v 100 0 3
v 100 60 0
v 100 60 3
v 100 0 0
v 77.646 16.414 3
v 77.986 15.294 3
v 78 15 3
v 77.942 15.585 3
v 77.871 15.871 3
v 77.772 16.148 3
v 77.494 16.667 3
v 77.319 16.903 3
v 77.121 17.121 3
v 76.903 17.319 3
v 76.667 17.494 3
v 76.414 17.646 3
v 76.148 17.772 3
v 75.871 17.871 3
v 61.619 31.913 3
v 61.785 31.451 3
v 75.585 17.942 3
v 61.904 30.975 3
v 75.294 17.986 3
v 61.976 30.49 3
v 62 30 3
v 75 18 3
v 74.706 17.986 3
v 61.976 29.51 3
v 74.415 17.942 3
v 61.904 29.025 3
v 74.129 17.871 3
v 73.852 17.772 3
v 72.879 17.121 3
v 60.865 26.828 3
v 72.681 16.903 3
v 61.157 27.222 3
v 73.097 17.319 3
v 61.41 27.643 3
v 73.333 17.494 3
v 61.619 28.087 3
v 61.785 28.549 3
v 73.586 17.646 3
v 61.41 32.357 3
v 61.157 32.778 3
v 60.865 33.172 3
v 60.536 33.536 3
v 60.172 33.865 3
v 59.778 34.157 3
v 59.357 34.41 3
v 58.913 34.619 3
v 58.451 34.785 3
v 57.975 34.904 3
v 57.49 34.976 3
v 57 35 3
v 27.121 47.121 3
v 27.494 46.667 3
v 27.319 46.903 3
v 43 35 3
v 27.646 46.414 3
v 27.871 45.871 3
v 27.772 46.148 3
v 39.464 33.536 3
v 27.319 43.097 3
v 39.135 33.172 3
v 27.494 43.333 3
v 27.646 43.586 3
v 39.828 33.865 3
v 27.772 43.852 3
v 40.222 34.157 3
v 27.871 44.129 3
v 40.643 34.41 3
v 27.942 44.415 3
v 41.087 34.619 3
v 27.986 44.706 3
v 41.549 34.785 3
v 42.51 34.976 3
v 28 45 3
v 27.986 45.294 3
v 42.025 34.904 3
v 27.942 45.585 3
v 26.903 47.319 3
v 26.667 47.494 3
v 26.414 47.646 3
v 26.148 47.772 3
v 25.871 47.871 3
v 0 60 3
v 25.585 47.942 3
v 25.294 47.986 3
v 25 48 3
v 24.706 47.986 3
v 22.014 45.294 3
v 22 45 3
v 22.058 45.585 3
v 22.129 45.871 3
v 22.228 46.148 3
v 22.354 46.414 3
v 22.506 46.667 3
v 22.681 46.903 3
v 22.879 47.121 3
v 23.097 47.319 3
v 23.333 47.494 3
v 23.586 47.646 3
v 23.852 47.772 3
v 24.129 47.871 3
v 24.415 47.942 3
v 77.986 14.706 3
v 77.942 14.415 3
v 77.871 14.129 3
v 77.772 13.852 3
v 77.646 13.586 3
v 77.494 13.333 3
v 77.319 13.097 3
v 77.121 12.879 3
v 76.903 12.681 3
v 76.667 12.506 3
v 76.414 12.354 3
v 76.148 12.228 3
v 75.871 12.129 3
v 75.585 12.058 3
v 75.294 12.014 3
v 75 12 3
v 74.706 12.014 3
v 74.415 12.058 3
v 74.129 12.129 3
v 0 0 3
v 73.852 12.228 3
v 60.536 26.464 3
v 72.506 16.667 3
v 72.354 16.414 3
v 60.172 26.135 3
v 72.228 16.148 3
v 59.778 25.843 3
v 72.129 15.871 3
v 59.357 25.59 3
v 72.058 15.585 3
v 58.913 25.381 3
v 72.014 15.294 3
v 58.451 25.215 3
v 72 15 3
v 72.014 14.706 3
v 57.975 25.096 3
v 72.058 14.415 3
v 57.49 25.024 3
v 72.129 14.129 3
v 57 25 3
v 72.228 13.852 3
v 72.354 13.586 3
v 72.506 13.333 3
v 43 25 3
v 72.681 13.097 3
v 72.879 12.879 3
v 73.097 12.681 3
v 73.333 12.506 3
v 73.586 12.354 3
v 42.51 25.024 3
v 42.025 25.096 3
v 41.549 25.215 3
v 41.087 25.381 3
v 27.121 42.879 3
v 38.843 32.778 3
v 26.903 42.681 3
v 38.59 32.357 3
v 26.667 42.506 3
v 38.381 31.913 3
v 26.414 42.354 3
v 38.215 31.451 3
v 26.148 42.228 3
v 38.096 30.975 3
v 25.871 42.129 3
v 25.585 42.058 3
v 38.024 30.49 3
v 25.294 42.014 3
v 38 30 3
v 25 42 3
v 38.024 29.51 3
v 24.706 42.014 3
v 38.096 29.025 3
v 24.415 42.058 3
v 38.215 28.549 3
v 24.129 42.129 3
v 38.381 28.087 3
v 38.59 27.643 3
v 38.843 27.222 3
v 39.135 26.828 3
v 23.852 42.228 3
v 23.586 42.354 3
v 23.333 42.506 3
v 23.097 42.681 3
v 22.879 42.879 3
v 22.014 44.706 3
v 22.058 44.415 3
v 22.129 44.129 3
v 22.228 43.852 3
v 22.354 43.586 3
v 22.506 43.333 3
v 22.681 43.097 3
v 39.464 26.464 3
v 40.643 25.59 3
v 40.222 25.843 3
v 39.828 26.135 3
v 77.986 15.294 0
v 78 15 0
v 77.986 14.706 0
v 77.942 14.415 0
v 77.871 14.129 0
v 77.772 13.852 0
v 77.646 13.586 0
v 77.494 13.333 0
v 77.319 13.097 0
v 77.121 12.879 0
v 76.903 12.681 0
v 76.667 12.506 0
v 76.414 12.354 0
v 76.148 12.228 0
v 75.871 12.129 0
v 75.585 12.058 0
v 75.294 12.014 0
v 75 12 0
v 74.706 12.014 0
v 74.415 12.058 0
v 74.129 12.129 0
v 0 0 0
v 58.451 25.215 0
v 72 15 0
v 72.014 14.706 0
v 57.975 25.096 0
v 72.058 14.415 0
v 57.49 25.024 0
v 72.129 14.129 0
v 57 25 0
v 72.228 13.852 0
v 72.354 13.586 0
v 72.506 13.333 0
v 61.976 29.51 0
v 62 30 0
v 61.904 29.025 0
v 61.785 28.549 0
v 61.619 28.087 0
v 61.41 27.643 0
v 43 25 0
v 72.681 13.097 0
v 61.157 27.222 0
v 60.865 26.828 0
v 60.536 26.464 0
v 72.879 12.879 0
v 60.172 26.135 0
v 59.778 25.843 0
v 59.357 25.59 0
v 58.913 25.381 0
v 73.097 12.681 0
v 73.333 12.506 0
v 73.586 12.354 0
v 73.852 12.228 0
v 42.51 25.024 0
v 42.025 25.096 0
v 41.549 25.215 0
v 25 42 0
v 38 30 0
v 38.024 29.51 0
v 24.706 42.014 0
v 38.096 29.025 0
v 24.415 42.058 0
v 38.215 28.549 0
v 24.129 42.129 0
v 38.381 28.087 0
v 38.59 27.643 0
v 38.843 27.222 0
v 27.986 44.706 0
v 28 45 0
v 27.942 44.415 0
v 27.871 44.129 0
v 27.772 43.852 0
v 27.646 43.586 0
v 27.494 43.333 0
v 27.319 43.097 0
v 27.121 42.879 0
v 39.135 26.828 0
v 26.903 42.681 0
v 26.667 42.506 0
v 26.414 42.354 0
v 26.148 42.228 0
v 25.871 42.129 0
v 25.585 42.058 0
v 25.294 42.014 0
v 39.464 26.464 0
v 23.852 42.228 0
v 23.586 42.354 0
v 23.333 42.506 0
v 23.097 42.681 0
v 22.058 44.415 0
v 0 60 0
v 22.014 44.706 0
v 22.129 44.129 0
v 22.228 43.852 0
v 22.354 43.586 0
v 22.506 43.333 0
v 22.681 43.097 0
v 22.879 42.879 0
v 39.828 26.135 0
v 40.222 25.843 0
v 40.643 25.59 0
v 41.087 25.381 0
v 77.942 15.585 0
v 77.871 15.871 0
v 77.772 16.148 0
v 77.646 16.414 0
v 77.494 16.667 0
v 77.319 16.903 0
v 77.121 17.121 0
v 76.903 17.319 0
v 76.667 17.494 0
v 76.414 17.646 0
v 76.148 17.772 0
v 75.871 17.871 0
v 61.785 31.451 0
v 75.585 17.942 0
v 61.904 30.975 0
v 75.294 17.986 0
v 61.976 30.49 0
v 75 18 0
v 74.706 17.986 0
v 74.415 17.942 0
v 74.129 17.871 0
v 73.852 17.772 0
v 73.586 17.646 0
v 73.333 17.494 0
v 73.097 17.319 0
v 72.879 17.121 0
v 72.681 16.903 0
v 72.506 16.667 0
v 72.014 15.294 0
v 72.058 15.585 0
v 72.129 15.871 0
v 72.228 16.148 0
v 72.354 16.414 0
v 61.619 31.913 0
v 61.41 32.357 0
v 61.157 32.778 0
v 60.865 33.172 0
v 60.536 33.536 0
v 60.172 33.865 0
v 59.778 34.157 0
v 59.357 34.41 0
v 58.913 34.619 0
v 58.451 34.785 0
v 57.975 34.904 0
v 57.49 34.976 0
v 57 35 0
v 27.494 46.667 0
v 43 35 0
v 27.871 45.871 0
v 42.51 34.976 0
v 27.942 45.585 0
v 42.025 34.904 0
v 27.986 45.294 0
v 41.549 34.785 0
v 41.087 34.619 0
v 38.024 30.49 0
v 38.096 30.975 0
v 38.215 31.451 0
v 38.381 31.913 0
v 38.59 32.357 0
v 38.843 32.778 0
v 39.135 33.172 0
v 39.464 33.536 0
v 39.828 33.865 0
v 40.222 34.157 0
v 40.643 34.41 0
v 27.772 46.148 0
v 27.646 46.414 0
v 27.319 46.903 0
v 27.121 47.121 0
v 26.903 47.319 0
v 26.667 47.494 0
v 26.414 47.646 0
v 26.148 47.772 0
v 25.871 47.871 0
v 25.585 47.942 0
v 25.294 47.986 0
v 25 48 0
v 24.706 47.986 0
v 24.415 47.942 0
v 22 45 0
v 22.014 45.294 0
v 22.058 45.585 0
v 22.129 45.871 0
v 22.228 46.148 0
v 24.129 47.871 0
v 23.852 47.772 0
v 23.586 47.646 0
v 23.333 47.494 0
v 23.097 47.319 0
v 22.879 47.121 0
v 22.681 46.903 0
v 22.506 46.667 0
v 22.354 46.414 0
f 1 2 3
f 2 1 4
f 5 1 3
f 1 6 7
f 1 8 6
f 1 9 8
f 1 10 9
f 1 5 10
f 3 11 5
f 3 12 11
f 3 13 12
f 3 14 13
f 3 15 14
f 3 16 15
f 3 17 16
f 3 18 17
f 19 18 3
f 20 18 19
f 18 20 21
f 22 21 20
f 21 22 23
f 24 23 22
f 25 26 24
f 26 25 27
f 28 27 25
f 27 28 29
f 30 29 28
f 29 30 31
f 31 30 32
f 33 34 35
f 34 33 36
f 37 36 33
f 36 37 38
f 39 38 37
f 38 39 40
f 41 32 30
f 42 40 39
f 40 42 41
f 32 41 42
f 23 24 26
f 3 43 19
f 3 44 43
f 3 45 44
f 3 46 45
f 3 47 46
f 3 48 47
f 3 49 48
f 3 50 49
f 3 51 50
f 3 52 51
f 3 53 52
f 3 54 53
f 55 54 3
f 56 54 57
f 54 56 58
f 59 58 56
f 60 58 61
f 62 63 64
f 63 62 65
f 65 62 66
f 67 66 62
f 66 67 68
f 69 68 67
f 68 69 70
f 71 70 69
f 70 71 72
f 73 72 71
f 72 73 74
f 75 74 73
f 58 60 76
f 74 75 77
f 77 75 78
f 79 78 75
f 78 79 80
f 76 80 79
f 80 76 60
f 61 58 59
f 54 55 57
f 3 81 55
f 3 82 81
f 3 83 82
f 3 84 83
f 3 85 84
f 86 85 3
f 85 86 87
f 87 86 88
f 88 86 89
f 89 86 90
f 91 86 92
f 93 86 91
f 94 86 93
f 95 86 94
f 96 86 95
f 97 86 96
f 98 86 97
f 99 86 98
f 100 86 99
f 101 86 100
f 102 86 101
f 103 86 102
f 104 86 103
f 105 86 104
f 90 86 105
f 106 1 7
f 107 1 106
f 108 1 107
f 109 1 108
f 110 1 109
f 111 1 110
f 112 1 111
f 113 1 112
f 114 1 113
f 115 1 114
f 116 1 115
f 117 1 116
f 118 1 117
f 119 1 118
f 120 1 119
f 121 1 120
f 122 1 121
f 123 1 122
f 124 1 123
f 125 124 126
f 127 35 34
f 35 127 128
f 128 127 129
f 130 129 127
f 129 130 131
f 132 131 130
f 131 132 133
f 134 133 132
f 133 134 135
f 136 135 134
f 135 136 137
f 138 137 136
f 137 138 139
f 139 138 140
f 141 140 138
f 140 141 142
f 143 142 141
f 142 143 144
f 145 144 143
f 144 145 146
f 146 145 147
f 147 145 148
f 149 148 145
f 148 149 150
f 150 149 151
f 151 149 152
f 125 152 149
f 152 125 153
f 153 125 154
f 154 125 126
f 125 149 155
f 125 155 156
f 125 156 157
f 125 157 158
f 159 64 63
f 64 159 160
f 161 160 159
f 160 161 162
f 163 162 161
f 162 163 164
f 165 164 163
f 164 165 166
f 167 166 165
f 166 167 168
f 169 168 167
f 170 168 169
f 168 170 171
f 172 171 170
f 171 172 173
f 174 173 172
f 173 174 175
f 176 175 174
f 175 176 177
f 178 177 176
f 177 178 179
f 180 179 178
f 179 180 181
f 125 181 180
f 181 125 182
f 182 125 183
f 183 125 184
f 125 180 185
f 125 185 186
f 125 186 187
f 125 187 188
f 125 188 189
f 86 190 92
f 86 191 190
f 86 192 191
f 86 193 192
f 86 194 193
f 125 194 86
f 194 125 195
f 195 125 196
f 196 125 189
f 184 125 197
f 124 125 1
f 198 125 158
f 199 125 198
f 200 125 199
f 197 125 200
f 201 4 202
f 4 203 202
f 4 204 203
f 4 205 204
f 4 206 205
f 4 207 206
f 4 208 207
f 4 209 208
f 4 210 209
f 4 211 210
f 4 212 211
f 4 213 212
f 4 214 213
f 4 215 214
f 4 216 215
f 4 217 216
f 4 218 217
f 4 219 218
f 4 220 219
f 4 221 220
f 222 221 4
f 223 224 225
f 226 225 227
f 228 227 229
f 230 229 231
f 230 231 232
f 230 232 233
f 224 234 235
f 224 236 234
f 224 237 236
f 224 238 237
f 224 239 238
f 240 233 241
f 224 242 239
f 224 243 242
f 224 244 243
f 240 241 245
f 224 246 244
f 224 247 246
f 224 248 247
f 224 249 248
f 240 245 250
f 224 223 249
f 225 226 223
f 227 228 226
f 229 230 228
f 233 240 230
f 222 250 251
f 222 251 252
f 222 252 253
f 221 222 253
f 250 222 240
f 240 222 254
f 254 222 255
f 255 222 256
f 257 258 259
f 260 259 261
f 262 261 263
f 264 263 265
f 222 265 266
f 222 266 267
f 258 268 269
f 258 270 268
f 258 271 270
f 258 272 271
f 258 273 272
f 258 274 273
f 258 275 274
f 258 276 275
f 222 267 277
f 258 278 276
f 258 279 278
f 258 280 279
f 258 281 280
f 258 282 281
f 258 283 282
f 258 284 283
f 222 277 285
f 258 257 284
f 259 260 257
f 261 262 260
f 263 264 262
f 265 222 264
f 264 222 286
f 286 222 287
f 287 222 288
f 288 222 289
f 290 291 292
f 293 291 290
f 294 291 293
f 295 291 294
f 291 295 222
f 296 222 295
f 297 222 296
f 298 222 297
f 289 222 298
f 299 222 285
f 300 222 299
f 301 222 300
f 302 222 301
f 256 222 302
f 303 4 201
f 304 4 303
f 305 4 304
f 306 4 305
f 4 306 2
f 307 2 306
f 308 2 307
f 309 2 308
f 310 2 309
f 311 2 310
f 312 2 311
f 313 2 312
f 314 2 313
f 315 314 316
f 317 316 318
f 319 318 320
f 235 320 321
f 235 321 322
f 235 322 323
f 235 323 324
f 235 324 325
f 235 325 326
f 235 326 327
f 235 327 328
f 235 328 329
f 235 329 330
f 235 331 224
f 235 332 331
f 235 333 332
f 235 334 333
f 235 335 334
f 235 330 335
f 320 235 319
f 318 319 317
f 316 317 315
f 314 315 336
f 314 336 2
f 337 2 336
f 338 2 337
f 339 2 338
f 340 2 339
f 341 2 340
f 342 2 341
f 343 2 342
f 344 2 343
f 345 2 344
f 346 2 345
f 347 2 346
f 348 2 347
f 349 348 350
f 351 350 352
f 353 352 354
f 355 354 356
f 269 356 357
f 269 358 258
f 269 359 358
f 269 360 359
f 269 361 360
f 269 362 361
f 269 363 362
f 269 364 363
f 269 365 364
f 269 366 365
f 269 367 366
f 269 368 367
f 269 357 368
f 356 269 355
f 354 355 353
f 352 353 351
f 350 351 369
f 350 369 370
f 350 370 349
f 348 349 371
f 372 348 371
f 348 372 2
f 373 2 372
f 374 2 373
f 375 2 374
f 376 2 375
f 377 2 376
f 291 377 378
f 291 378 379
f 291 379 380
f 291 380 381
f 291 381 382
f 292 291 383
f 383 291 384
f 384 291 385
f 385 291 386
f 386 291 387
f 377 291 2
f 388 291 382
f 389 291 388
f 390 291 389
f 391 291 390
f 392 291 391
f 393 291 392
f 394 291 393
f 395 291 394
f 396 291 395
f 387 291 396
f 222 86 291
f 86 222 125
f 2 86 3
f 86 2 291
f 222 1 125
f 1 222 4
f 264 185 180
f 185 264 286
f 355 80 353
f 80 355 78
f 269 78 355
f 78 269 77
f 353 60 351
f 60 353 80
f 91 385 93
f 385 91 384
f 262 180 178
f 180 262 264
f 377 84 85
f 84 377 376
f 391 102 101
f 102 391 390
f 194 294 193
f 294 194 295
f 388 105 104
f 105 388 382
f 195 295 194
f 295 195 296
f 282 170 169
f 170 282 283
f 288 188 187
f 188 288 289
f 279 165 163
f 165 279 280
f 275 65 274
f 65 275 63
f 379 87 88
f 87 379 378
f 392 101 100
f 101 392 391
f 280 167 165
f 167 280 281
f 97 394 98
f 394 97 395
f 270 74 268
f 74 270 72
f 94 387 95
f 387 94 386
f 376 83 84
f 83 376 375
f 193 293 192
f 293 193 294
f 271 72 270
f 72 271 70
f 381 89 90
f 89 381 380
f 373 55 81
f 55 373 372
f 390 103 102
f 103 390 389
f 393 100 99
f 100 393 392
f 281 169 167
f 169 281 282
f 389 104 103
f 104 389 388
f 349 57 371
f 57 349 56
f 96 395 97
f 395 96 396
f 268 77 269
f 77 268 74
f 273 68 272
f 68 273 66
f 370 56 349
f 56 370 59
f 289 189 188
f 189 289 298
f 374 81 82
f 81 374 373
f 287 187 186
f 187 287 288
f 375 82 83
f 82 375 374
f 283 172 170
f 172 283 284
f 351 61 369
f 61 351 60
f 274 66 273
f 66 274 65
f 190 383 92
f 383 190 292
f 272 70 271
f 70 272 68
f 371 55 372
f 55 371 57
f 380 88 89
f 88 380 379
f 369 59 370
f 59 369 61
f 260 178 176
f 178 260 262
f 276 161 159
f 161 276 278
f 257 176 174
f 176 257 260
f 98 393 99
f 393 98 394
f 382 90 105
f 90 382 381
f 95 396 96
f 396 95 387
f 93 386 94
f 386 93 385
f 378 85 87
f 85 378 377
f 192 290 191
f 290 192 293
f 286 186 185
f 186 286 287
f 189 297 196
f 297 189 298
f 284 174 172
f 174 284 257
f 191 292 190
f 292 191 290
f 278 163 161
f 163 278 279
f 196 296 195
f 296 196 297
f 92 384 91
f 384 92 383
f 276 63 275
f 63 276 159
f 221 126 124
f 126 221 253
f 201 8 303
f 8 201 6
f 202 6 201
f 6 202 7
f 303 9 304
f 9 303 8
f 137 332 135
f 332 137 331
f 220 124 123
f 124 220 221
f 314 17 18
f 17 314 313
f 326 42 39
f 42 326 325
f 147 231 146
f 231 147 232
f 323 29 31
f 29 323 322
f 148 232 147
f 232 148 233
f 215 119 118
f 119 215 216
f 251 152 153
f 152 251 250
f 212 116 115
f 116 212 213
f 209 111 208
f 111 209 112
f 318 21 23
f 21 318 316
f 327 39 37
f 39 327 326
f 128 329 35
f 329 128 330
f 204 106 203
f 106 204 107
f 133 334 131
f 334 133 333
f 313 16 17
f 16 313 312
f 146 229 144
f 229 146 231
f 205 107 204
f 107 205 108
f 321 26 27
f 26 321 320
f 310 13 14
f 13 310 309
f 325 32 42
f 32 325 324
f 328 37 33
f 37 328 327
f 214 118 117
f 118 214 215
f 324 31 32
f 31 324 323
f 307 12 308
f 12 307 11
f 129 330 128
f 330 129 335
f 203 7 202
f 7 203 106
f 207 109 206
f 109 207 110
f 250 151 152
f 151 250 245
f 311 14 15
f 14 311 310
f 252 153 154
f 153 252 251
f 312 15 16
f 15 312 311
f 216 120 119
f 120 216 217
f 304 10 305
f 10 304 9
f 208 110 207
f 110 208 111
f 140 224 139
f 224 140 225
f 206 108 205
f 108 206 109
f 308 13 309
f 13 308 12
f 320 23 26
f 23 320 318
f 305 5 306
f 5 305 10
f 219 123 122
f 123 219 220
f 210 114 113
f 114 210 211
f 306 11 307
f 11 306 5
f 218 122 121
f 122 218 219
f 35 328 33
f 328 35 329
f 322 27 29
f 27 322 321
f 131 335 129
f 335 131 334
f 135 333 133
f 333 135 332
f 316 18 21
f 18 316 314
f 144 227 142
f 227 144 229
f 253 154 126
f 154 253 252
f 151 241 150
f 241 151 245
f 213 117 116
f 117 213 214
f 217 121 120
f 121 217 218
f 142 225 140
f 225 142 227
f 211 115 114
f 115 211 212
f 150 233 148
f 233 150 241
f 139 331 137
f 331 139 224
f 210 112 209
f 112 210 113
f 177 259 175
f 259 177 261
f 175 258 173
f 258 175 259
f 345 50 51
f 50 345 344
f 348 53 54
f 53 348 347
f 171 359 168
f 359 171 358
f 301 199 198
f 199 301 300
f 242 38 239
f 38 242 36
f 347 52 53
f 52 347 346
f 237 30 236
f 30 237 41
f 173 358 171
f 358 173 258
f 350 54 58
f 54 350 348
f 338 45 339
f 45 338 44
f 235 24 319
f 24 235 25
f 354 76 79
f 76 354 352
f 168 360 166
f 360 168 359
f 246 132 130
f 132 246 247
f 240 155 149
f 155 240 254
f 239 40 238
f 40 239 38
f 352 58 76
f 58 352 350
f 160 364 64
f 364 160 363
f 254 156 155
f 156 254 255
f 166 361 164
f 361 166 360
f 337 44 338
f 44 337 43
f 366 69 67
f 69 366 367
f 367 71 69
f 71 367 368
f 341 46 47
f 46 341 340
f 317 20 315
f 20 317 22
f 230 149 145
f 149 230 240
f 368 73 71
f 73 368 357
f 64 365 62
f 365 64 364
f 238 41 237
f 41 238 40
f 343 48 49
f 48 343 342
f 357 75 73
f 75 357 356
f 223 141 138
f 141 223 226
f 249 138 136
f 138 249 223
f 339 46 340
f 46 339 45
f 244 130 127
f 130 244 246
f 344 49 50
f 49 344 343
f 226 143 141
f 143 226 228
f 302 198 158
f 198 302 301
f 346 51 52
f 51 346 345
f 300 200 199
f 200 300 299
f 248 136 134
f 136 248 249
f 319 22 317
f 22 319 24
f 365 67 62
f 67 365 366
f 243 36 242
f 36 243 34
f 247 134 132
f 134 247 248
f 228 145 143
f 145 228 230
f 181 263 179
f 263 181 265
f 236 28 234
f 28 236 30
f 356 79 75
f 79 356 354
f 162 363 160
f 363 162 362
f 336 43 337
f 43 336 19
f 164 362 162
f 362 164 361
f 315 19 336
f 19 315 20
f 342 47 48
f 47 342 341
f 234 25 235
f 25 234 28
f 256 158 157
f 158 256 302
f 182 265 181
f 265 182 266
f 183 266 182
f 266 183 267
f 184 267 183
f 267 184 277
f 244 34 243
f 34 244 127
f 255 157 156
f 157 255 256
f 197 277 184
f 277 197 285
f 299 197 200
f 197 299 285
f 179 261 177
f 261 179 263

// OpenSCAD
// fixture: the policy answer is the model's truth (issue #81 EV-1)
// identical layout to plate_5mm but 3 mm thick — exactly what the frozen
// clarification policy (wall/uniform thickness 3 mm) tells an honest model
// to build when thickness is absent from ink and notes.
$fn = 64;
difference() {
  cube([100, 60, 3]);
  translate([25, 45, -1]) cylinder(d = 6, h = 5);
  translate([75, 15, -1]) cylinder(d = 6, h = 5);
  translate([50, 30, -1])
    linear_extrude(height = 5)
      hull() {
        translate([-(24 - 10) / 2, 0]) circle(d = 10);
        translate([(24 - 10) / 2, 0]) circle(d = 10);
      }
}
